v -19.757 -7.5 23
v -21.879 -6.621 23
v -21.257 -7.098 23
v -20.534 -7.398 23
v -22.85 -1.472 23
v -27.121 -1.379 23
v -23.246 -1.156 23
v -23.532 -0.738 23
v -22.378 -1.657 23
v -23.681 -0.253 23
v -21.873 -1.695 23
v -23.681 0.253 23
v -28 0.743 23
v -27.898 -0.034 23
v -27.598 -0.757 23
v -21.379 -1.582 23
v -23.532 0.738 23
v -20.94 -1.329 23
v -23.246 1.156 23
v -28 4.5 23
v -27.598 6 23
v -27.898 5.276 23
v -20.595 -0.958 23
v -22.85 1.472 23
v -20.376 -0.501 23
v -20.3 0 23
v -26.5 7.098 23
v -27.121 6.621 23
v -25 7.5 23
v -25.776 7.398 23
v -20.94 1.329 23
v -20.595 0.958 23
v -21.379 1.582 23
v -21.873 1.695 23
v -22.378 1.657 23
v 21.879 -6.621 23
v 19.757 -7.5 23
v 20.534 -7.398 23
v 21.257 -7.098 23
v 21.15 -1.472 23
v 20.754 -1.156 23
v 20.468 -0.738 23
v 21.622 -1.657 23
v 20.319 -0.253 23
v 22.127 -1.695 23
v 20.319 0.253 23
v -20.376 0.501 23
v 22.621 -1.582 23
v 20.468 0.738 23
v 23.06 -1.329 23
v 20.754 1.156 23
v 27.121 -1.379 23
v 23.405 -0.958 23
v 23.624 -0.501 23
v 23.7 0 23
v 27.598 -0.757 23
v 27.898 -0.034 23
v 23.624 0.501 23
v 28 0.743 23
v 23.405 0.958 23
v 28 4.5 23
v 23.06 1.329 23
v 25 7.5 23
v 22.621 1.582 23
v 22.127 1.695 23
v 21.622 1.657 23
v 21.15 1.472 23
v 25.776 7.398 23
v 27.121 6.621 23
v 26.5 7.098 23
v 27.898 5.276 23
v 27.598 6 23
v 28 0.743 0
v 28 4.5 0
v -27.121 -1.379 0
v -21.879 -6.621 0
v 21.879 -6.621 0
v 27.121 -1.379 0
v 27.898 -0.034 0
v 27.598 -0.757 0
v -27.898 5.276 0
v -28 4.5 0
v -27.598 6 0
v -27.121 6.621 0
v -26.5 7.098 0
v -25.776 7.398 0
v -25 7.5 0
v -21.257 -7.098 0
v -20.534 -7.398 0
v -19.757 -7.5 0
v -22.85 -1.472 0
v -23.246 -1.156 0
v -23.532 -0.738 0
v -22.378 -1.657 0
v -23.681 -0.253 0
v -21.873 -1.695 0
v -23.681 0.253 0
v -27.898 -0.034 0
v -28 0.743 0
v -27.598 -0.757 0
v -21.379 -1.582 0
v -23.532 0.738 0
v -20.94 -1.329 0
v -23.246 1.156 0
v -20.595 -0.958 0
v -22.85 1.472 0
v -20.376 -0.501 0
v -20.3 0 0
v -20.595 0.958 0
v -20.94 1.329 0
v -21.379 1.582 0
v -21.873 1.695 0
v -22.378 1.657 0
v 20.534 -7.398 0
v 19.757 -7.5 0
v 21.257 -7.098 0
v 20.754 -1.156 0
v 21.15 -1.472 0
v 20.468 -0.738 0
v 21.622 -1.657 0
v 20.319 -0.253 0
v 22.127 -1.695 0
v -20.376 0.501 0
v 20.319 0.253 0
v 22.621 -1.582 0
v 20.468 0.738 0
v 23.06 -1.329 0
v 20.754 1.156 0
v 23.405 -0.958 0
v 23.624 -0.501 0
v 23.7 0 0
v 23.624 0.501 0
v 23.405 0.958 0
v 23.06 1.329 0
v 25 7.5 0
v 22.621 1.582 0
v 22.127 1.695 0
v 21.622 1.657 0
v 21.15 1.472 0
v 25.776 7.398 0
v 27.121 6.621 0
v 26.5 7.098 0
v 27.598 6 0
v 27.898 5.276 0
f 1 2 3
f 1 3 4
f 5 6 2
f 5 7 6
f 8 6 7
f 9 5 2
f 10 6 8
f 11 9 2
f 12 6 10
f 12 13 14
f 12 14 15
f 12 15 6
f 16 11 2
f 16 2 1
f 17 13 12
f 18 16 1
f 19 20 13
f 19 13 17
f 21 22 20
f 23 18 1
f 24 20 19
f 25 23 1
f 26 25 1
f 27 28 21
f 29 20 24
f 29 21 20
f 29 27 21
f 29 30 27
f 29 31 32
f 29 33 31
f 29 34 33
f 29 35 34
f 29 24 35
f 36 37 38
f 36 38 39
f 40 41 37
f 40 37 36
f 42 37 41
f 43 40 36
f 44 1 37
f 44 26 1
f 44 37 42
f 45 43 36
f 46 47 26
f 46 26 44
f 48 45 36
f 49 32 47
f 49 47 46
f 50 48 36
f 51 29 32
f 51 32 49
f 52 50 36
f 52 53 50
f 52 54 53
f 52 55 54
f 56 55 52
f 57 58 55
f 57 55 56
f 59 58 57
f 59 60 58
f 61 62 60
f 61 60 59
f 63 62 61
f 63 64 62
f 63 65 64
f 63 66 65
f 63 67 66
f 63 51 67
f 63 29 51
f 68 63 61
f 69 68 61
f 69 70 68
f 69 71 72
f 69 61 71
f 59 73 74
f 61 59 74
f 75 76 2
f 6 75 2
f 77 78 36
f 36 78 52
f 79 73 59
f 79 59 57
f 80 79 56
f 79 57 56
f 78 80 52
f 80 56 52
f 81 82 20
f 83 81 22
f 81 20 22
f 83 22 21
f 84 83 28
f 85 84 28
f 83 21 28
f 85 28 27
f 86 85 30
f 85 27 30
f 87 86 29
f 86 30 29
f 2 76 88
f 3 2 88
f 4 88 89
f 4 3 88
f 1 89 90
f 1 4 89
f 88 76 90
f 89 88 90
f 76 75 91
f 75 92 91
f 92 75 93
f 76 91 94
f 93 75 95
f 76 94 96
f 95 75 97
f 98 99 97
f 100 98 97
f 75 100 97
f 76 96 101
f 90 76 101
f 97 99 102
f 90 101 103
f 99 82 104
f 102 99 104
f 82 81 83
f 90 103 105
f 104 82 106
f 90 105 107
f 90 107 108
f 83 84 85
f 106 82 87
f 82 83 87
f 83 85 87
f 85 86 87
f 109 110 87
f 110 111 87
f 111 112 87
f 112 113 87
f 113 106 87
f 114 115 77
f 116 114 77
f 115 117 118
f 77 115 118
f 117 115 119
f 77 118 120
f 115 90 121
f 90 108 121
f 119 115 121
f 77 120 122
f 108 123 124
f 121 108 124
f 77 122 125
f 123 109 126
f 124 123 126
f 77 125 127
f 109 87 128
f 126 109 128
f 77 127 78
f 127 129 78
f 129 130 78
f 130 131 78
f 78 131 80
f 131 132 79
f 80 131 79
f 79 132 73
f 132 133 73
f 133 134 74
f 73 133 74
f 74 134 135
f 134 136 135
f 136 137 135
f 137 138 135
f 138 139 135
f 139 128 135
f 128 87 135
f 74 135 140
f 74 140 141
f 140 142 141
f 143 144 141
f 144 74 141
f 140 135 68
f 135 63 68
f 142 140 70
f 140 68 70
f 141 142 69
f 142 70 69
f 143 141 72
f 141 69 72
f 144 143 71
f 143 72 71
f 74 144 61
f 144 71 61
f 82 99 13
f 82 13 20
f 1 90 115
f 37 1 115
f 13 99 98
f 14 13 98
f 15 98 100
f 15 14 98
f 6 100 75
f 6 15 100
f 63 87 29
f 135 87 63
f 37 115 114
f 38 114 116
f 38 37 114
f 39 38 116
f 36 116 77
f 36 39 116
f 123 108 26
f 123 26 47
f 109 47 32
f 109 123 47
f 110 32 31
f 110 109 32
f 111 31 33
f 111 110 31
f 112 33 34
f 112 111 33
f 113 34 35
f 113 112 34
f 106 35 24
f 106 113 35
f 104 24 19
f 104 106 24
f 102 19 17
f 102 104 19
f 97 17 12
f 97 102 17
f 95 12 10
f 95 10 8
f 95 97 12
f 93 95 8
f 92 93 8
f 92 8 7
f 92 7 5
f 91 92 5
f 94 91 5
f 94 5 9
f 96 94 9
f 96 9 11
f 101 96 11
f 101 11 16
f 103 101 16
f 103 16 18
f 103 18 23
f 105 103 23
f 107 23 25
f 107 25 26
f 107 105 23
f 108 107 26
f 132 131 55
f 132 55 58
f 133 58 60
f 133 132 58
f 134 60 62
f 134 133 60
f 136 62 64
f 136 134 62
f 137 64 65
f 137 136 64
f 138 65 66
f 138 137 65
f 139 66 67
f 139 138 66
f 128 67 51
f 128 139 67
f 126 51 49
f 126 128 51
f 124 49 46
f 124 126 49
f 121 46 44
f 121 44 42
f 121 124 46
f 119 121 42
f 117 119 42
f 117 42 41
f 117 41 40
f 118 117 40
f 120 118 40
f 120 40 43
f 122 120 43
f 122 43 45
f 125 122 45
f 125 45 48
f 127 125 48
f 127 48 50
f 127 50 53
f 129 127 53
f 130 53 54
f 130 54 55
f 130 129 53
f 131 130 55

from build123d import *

# Parameters (mm, degrees)
SKETCH_1_W      = 56
SKETCH_1_H      = 15
SKETCH_1_R      = 1.7
EXTRUDE_1_DEPTH = 23
CHAMFER_2_SIZE  = 7
FILLET_1_R      = 3


with BuildPart() as part:
    # 草图1 → 凸台-拉伸1 (new body)
    with BuildSketch(Plane.XY):
        Rectangle(SKETCH_1_W, SKETCH_1_H)
        with Locations((22, 0)):
            Circle(SKETCH_1_R, mode=Mode.SUBTRACT)
        with Locations((-22, 0)):
            Circle(SKETCH_1_R, mode=Mode.SUBTRACT)
    extrude(amount=EXTRUDE_1_DEPTH)

    # 倒角2
    chamfer_2_edges = [part.edges().sort_by_distance(p)[0] for p in [
        (28, -7.5, 11.5),
        (-28, -7.5, 11.5),
    ]]
    chamfer(chamfer_2_edges, length=CHAMFER_2_SIZE)

    # 圆角1
    fillet_1_edges = [part.edges().sort_by_distance(p)[0] for p in [
        (28, -0.5, 11.5),
        (-21, -7.5, 11.5),
        (21, -7.5, 11.5),
        (-28, -0.5, 11.5),
        (-28, 7.5, 11.5),
        (28, 7.5, 11.5),
    ]]
    fillet(fillet_1_edges, radius=FILLET_1_R)


solid = part.part
